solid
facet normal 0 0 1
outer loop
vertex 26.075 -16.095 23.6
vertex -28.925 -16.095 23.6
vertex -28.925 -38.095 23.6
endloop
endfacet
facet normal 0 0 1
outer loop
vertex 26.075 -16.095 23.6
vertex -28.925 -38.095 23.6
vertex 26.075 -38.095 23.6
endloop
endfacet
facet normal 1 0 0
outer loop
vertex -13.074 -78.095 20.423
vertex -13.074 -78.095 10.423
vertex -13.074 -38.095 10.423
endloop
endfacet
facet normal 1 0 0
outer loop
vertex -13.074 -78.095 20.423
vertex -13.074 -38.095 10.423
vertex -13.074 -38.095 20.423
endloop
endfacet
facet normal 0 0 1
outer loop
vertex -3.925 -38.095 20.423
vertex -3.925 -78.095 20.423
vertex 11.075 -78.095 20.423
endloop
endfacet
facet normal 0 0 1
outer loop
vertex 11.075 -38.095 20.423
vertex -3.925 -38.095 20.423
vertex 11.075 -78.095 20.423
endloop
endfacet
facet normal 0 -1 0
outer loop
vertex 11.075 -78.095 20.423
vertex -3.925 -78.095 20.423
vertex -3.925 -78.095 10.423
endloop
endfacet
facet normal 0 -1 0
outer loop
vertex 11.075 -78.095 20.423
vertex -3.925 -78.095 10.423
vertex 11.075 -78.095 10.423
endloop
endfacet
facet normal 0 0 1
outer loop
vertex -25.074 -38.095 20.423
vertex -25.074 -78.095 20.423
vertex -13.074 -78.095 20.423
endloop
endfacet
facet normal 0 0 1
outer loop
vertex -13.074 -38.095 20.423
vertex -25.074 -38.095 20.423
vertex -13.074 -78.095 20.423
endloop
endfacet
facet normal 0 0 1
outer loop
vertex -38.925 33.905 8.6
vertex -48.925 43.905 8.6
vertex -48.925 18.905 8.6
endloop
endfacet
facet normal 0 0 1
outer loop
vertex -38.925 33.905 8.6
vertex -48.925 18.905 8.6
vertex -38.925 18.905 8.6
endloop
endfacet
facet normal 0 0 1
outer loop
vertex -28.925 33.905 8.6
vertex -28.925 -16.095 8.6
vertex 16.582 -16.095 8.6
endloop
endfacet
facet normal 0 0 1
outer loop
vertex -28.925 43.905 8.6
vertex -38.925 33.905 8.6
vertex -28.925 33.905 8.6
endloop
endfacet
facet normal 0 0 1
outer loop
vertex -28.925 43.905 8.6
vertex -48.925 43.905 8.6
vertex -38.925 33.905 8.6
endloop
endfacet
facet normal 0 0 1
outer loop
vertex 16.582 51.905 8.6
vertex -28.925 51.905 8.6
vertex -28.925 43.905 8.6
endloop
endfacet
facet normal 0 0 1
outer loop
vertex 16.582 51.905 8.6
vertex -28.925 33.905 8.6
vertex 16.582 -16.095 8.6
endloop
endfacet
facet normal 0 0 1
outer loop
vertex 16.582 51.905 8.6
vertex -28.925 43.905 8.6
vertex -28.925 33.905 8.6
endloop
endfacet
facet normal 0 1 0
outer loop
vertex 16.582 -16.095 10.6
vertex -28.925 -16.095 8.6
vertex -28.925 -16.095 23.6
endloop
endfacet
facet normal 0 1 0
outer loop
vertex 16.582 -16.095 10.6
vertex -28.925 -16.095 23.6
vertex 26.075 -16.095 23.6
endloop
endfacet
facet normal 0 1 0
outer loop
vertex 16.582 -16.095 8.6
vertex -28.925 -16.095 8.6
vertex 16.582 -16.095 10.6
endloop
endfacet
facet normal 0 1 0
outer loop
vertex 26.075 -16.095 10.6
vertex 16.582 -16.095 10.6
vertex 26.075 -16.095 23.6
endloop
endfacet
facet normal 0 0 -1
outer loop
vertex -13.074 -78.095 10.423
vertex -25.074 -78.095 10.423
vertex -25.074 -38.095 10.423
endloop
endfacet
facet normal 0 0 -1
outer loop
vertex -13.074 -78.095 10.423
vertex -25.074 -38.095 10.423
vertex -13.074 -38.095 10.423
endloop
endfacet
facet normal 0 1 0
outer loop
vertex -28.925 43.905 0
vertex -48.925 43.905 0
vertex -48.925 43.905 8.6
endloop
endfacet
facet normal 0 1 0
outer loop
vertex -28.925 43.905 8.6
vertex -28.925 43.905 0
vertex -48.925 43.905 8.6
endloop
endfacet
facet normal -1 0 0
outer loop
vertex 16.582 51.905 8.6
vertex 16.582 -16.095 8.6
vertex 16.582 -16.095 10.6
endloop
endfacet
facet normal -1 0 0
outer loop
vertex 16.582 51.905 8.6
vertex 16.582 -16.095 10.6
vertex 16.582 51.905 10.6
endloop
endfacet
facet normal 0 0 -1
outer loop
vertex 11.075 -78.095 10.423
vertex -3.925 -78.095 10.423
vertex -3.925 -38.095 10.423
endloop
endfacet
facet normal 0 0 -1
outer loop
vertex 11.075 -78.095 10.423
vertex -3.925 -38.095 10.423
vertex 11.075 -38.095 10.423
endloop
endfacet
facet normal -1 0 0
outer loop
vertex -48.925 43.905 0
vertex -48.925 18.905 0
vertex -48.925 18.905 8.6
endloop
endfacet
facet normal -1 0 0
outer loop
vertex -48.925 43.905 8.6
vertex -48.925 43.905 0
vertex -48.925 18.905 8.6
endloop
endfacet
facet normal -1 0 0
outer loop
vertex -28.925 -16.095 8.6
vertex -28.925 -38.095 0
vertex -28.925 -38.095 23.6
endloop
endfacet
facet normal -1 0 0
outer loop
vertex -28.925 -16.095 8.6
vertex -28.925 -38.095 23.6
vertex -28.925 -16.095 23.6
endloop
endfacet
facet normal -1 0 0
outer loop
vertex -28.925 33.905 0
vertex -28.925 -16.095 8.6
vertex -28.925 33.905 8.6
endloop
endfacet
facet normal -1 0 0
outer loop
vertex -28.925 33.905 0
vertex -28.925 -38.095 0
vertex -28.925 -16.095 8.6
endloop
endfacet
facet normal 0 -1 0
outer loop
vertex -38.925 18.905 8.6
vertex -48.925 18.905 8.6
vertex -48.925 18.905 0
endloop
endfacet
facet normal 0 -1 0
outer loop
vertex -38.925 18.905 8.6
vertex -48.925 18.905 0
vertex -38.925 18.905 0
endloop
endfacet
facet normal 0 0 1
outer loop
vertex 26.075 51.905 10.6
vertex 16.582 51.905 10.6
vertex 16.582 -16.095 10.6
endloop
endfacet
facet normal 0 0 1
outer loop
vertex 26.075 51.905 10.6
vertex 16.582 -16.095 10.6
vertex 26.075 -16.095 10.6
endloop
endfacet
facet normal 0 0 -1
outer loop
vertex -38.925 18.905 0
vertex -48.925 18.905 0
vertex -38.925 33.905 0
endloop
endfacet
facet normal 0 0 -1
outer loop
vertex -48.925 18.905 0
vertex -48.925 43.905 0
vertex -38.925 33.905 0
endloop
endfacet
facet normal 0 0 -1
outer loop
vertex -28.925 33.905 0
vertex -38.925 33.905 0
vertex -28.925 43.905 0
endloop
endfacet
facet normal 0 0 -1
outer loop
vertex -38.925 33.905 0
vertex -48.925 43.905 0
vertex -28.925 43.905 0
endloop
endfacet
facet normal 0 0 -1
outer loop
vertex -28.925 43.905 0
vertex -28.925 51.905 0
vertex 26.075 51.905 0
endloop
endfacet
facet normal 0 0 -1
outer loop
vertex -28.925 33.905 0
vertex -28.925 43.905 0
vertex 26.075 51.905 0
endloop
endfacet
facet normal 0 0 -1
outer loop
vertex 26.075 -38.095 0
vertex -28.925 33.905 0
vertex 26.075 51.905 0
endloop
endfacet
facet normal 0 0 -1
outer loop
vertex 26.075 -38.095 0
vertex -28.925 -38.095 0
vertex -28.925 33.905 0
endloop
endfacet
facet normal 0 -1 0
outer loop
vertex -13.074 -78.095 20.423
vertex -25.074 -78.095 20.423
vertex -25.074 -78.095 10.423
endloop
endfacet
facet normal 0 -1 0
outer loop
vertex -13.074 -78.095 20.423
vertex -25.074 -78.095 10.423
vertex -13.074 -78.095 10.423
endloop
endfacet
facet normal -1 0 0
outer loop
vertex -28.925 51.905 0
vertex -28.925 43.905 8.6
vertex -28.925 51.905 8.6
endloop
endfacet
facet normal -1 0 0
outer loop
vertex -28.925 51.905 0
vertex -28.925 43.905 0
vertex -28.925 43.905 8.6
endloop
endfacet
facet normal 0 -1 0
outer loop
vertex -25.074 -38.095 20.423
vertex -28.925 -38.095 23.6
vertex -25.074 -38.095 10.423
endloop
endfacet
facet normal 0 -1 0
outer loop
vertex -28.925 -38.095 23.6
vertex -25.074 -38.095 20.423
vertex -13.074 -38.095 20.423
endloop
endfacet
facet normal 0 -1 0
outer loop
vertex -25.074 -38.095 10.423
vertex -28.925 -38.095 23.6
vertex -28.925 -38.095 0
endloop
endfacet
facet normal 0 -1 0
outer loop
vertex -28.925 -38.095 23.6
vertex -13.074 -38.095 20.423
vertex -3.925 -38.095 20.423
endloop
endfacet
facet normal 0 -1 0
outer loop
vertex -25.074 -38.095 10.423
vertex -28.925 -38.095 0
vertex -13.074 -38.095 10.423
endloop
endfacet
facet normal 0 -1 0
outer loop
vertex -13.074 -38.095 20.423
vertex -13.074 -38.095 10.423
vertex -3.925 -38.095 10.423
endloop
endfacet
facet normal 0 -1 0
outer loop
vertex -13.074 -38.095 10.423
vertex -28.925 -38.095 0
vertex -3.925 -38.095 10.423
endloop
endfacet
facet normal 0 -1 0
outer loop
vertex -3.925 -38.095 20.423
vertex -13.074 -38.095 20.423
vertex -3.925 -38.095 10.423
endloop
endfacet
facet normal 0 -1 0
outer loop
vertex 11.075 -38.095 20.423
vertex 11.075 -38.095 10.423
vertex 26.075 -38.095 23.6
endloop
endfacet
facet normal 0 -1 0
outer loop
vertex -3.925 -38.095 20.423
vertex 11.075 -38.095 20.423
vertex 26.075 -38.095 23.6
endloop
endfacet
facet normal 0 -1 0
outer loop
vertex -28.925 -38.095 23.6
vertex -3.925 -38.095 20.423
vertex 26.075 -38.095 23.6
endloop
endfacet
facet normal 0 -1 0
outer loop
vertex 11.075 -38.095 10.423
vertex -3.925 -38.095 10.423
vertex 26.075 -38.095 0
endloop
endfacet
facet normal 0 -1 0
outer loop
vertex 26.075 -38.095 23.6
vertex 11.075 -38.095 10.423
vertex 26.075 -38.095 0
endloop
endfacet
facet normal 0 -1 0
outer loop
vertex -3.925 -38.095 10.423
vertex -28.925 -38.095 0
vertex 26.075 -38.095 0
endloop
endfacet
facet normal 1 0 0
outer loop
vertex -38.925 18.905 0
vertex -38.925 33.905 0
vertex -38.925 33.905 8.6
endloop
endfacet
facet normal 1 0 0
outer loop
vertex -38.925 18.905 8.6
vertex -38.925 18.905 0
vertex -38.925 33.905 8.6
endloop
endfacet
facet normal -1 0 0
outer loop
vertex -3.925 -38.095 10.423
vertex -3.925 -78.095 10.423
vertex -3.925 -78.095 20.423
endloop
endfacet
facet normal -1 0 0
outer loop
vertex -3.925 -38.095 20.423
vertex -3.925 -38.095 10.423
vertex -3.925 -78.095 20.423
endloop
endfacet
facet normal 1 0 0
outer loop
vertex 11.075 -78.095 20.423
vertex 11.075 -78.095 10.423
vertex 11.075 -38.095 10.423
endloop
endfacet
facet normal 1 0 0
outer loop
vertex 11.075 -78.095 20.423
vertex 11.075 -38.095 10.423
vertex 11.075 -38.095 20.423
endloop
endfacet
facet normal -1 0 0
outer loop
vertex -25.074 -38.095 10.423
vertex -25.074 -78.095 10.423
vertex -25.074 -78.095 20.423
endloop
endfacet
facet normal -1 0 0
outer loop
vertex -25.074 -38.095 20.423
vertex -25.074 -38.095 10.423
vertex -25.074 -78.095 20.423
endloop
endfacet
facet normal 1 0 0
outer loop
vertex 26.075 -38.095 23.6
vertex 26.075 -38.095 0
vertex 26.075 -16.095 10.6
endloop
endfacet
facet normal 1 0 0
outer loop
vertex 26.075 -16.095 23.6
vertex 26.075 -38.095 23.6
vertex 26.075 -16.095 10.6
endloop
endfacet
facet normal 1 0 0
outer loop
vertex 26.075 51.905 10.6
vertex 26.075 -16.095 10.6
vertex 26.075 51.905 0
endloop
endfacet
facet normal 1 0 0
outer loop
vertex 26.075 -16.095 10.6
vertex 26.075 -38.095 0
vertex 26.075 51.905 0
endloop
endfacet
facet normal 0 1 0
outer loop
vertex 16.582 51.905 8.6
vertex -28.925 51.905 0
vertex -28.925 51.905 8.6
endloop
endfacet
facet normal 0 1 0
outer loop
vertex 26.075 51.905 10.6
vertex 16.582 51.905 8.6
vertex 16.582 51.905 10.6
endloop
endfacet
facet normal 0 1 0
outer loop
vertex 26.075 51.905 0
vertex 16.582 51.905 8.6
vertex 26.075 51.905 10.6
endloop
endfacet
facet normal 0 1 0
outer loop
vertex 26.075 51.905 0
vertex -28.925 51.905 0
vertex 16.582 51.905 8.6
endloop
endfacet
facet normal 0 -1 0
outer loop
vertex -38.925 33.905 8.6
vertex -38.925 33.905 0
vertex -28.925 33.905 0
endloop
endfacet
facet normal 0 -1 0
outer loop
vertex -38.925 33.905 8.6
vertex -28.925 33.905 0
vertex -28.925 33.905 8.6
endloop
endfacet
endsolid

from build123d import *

# Parameters (mm, degrees)
F0_W      = 55
F0_H      = 90
F1_DEPTH  = 1.6
F2_W      = 55
F2_H      = 22
F3_DEPTH  = 22
F4_W      = 15
F4_H      = 10
F4_W_2    = 12
F5_DEPTH  = 40
F6_DEPTH  = 7
F7_W      = 9.4927671924
F7_H      = 68
F8_DEPTH  = 2
F9_W      = 10
F9_H      = 8.6
F10_DEPTH = 20
F11_W     = 10
F11_H     = 8.6
F12_DEPTH = 15


with BuildPart() as f1:
    # F0 (on Top) → F1 (new body)
    with BuildSketch(Plane.XY):
        with Locations((-1.4253398404, 6.9053554087)):
            Rectangle(F0_W, F0_H)
    extrude(amount=F1_DEPTH)

    # F2 (on face) → F3 (join)
    with BuildSketch(Plane.XY.offset(1.6)):
        with Locations((-1.4253398404, -27.0946445913)):
            Rectangle(F2_W, F2_H)
    extrude(amount=F3_DEPTH)

    # F4 (on face) → F5 (join)
    with BuildSketch(Plane.XZ.offset(38.0946445913)):
        with Locations((3.5746601596, 15.4229834428)):
            Rectangle(F4_W, F4_H)
        with Locations((-19.0744694758, 15.4229834428)):
            Rectangle(F4_W_2, F4_H)
    extrude(amount=F5_DEPTH)

    # F6 (add): a face of the model
    f6_faces = [f1.faces().sort_by_distance(p)[0] for p in [
        (-1.4253398404, 17.9053554087, 1.6),
    ]]
    extrude(f6_faces, amount=F6_DEPTH)

    # F7 (on face) → F8 (join)
    with BuildSketch(Plane.XY.offset(8.6)):
        with Locations((21.3282765634, 17.9053554087)):
            Rectangle(F7_W, F7_H)
    extrude(amount=F8_DEPTH)

    # F9 (on face) → F10 (join)
    with BuildSketch(Plane(origin=(-28.9253398404, 0, 0), x_dir=(0, -1, 0), z_dir=(-1, 0, 0))):
        with Locations((-38.9053554087, 4.3)):
            Rectangle(F9_W, F9_H)
    extrude(amount=F10_DEPTH)

    # F11 (on face) → F12 (join)
    with BuildSketch(Plane.XZ.offset(-33.9053554087)):
        with Locations((-43.9253398404, 4.3)):
            Rectangle(F11_W, F11_H)
    extrude(amount=F12_DEPTH)


solid = f1.part
